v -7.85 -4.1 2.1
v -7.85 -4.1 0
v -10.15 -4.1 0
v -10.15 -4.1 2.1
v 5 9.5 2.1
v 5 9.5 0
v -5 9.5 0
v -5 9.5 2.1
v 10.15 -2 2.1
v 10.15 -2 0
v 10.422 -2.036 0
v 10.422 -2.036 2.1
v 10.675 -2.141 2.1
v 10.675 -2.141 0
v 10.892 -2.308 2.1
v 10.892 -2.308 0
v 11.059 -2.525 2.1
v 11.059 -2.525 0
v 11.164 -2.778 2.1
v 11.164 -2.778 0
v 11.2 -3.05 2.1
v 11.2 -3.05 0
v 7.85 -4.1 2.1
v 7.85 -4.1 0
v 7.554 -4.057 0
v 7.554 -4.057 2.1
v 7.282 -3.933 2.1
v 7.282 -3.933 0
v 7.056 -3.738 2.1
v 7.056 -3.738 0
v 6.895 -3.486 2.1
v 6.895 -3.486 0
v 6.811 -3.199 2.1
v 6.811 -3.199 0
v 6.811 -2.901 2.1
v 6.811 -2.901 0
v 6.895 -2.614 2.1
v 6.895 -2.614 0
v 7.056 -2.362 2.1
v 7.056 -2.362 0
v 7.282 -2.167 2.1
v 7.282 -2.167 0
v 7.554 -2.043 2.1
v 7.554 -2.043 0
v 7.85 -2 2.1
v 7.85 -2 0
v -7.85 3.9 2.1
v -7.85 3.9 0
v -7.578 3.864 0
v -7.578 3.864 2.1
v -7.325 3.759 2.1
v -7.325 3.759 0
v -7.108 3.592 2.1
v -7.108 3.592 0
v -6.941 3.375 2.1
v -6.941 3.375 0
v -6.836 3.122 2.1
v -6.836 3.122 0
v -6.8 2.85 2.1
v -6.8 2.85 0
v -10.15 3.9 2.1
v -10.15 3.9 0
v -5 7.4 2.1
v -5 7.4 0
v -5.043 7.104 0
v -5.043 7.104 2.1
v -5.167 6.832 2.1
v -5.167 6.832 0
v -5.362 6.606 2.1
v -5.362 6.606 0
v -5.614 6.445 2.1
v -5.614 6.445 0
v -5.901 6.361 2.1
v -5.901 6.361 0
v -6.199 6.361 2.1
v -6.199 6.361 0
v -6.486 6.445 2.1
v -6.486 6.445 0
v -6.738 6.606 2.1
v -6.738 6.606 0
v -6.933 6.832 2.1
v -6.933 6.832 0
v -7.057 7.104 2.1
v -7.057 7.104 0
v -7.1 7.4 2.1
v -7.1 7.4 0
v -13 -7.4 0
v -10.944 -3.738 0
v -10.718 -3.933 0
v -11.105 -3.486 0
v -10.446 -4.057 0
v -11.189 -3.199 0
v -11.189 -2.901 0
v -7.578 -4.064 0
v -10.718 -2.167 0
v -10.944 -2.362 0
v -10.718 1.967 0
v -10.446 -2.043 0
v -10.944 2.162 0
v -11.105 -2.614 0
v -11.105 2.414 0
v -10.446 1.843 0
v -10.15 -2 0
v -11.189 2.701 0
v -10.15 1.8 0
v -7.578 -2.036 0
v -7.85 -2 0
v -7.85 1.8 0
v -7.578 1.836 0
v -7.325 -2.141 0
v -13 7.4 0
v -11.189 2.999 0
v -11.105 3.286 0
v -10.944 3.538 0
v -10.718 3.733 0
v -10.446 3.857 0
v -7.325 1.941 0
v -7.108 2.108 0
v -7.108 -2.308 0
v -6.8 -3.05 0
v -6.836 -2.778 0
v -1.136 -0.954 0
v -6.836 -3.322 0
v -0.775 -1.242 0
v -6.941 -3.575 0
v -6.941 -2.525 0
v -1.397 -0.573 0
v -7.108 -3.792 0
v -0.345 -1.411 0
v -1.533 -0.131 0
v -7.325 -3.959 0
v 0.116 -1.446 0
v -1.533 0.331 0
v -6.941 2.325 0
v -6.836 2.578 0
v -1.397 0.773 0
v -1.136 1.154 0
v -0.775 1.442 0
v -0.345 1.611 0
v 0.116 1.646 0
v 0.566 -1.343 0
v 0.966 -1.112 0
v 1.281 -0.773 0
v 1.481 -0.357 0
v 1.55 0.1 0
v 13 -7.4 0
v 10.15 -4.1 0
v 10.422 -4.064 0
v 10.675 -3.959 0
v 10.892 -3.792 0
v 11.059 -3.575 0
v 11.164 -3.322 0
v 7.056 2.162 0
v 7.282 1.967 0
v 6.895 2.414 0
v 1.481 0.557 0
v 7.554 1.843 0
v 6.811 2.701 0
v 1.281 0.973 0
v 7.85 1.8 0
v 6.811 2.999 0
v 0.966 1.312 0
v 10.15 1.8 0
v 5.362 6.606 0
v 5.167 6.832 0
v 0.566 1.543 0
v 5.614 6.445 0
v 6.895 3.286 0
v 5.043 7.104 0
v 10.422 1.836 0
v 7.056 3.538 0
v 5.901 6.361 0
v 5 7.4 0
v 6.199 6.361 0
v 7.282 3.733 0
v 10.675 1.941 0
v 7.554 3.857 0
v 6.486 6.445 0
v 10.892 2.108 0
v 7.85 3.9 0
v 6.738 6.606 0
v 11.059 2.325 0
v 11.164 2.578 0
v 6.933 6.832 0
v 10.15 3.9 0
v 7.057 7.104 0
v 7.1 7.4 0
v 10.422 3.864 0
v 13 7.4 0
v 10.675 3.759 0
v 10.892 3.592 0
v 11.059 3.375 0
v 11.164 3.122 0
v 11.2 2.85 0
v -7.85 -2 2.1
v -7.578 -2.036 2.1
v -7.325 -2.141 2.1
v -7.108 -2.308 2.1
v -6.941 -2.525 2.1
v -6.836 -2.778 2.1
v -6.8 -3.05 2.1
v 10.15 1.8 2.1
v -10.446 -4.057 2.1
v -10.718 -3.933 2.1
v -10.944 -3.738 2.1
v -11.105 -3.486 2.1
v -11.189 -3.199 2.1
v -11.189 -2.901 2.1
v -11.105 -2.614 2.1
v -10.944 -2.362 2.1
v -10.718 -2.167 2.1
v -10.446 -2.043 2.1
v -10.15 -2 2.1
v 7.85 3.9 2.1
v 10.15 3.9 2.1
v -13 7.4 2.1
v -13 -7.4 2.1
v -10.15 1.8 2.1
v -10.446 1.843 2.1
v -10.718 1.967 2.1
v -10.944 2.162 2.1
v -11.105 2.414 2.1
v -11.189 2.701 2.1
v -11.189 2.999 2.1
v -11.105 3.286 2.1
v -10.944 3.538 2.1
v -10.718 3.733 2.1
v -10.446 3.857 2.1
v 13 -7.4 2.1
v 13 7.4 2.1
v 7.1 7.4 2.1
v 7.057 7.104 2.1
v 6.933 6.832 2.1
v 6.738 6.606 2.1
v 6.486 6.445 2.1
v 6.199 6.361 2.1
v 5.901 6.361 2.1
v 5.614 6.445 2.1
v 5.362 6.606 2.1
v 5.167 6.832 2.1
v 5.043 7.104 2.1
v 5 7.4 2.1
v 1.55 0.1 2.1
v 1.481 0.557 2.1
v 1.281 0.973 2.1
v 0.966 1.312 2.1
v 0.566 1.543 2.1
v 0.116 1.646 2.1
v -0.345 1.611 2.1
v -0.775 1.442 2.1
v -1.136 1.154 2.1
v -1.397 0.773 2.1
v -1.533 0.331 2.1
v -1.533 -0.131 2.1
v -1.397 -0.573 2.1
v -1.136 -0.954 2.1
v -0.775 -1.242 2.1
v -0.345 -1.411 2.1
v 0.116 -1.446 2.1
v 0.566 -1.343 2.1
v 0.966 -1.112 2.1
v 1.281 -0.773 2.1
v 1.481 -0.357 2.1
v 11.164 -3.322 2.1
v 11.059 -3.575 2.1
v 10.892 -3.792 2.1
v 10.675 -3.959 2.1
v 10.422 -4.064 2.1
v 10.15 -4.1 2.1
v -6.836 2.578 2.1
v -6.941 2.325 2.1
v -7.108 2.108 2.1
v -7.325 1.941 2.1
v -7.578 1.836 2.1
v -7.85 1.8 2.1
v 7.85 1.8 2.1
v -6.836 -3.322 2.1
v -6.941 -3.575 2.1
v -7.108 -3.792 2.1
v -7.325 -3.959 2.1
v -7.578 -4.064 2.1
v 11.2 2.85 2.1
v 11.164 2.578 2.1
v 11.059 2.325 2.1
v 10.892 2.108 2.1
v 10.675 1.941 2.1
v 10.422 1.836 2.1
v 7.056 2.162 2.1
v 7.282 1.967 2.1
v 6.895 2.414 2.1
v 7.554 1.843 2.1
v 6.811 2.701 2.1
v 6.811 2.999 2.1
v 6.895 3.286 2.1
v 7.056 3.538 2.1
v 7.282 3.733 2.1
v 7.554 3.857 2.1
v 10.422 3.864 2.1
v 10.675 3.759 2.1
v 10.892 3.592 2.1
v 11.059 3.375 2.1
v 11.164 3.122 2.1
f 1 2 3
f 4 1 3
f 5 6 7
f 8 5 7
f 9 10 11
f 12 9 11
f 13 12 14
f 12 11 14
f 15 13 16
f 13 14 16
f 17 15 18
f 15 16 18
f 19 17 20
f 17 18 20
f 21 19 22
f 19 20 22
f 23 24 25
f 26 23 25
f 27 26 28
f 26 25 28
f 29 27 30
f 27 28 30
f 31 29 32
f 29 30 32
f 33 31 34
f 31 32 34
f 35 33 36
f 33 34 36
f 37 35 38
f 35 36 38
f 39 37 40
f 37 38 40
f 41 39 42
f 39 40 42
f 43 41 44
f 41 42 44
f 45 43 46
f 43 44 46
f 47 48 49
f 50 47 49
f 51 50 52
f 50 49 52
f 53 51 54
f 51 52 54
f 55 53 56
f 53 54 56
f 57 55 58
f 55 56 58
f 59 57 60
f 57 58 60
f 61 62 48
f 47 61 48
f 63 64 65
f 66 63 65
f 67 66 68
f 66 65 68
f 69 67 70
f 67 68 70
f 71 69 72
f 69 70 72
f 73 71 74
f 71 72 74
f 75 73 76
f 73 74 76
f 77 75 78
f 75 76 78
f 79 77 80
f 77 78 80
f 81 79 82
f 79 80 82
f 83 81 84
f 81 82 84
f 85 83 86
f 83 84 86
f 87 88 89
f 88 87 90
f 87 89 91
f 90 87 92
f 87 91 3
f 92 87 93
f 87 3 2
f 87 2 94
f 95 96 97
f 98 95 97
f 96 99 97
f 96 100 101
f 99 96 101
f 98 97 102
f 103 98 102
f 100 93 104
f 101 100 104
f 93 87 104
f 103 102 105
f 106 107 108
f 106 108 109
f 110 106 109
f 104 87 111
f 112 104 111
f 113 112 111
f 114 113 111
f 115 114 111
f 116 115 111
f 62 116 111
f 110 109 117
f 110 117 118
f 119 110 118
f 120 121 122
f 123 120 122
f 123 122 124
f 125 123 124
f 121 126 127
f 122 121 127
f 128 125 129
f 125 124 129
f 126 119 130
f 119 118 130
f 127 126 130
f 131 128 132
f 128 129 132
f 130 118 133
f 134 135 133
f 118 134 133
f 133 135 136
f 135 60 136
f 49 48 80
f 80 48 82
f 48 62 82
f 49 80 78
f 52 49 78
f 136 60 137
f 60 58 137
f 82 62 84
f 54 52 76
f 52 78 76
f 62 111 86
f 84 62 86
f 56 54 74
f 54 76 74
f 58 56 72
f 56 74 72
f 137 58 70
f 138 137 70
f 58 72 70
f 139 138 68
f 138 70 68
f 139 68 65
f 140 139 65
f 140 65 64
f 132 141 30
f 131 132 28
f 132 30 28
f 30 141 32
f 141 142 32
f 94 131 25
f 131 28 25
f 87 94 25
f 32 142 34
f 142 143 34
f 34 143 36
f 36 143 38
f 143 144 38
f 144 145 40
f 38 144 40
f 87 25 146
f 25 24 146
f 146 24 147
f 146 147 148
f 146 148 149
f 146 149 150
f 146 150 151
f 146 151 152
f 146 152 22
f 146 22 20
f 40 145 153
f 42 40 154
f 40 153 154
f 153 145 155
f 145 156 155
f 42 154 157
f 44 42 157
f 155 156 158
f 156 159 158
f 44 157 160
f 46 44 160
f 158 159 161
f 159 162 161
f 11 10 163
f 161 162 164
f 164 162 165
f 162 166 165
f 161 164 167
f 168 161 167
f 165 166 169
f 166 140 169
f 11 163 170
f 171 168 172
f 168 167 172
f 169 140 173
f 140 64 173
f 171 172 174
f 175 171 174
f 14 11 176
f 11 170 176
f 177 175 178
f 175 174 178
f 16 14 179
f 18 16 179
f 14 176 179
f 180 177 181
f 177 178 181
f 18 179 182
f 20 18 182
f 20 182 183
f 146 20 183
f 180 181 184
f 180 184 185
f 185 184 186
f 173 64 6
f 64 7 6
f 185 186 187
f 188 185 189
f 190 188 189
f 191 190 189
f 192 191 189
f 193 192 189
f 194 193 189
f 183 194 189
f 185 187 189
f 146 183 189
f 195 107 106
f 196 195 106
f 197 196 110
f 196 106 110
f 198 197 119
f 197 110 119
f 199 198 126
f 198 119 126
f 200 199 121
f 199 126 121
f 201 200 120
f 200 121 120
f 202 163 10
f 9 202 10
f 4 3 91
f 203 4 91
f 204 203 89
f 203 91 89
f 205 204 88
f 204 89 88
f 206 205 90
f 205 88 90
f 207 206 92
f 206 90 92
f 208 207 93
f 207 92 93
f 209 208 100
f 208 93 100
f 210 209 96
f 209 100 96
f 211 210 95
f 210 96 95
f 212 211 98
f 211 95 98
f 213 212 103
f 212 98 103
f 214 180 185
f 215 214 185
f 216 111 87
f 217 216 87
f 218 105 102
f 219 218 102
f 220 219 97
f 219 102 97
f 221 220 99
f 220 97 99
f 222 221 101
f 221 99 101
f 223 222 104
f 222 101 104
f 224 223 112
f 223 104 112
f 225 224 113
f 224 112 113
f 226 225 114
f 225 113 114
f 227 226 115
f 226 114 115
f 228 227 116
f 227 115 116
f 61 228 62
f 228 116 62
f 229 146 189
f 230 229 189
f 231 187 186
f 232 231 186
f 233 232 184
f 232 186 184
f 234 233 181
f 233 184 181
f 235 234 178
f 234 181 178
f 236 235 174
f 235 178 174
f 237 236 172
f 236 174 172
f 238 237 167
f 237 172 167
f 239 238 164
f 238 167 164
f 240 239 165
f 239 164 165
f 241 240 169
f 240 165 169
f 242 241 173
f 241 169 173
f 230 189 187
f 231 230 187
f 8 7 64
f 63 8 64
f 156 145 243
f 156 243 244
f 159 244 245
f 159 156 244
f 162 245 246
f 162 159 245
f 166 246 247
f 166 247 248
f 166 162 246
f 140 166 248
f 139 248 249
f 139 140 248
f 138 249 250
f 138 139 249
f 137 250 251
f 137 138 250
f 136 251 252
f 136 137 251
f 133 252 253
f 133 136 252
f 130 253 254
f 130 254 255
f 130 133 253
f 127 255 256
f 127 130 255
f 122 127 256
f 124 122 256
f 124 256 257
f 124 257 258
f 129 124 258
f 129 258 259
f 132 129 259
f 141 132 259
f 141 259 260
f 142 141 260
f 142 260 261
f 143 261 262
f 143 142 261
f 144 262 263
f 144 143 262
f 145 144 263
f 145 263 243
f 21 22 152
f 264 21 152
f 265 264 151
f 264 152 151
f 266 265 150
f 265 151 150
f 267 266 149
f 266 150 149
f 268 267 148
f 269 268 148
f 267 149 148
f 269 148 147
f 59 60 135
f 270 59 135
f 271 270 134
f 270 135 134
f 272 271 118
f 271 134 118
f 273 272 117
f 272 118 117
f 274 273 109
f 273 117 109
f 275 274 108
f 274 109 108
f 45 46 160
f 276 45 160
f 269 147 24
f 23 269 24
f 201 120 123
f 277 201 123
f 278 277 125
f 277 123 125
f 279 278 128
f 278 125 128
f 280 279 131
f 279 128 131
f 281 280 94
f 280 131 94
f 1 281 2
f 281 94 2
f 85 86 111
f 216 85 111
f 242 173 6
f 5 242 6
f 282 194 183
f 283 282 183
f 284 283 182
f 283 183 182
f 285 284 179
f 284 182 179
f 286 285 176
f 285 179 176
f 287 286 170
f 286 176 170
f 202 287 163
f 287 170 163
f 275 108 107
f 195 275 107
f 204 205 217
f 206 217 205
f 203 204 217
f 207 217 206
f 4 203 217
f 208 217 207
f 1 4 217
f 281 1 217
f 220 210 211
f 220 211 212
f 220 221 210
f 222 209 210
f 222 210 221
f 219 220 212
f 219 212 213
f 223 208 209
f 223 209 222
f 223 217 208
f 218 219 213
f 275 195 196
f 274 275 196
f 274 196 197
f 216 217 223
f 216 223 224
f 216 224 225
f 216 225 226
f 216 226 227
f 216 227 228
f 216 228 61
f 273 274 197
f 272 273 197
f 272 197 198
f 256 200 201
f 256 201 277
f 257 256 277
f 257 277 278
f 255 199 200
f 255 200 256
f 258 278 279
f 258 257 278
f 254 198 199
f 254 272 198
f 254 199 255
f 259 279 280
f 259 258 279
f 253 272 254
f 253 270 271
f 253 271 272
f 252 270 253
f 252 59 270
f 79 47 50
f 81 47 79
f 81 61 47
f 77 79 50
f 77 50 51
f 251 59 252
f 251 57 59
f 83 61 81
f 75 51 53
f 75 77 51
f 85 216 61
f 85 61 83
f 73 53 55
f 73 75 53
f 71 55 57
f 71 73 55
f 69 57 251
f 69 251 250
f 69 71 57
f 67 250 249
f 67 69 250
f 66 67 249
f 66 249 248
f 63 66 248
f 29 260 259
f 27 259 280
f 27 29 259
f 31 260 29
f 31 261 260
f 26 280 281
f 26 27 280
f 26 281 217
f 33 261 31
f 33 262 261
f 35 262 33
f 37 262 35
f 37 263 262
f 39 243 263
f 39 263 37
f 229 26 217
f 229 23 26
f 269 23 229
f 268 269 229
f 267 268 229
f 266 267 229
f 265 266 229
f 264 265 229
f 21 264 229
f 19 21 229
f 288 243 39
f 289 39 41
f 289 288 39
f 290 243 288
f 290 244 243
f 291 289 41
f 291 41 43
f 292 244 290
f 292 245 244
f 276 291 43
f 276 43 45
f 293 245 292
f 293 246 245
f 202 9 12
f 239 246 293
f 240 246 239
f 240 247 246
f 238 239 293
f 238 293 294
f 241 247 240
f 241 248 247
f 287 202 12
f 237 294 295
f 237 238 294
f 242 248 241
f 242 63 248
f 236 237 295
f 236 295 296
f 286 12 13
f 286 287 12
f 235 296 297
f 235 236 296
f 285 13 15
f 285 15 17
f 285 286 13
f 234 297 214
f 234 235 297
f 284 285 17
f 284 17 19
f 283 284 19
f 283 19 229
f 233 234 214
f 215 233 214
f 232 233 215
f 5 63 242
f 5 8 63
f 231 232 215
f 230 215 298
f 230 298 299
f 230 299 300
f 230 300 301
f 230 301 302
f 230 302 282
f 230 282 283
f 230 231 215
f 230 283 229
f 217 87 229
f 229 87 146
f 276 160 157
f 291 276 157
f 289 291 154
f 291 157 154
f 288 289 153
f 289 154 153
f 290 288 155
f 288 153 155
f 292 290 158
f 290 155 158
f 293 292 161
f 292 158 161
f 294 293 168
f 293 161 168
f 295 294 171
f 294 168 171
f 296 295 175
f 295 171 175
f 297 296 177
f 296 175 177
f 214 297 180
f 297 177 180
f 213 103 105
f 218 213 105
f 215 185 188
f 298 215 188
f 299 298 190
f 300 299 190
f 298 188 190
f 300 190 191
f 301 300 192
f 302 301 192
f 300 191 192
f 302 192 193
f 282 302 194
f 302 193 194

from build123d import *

# Parameters (mm, degrees)
SKETCH_1_R      = 1.55
EXTRUDE_1_DEPTH = 2.1


with BuildPart() as part:
    # 草图1 → 凸台-拉伸1 (new body)
    with BuildSketch(Plane.XY):
        with BuildLine():
            Line((-13, -7.4), (13, -7.4))
            Line((13, -7.4), (13, 7.4))
            Line((13, 7.4), (7.1, 7.4))
            ThreePointArc((7.1, 7.4), (6.05, 6.35), (5, 7.4))
            Line((5, 7.4), (5, 9.5))
            Line((5, 9.5), (-5, 9.5))
            Line((-5, 9.5), (-5, 7.4))
            ThreePointArc((-5, 7.4), (-6.05, 6.35), (-7.1, 7.4))
            Line((-7.1, 7.4), (-13, 7.4))
            Line((-13, 7.4), (-13, -7.4))
        make_face()
        with BuildLine():
            ThreePointArc((-6.8, -3.05), (-7.10753788, -3.79246212), (-7.85, -4.1))
            Line((-7.85, -4.1), (-10.15, -4.1))
            ThreePointArc((-10.15, -4.1), (-11.2, -3.05), (-10.15, -2))
            Line((-10.15, -2), (-10.15, 1.8))
            ThreePointArc((-10.15, 1.8), (-11.2, 2.85), (-10.15, 3.9))
            Line((-10.15, 3.9), (-7.85, 3.9))
            ThreePointArc((-7.85, 3.9), (-7.10753788, 3.59246212), (-6.8, 2.85))
            ThreePointArc((-6.8, 2.85), (-7.10753788, 2.10753788), (-7.85, 1.8))
            Line((-7.85, 1.8), (-7.85, -2))
            ThreePointArc((-7.85, -2), (-7.10753788, -2.30753788), (-6.8, -3.05))
        make_face(mode=Mode.SUBTRACT)
        with Locations((0, 0.1)):
            Circle(SKETCH_1_R, mode=Mode.SUBTRACT)
        with BuildLine():
            ThreePointArc((7.85, 1.8), (6.8, 2.85), (7.85, 3.9))
            Line((7.85, 3.9), (10.15, 3.9))
            ThreePointArc((10.15, 3.9), (10.89246212, 3.59246212), (11.2, 2.85))
            ThreePointArc((11.2, 2.85), (10.89246212, 2.10753788), (10.15, 1.8))
            Line((10.15, 1.8), (10.15, -2))
            ThreePointArc((10.15, -2), (10.89246212, -2.30753788), (11.2, -3.05))
            ThreePointArc((11.2, -3.05), (10.89246212, -3.79246212), (10.15, -4.1))
            Line((10.15, -4.1), (7.85, -4.1))
            ThreePointArc((7.85, -4.1), (6.8, -3.05), (7.85, -2))
            Line((7.85, -2), (7.85, 1.8))
        make_face(mode=Mode.SUBTRACT)
    extrude(amount=EXTRUDE_1_DEPTH)


solid = part.part
